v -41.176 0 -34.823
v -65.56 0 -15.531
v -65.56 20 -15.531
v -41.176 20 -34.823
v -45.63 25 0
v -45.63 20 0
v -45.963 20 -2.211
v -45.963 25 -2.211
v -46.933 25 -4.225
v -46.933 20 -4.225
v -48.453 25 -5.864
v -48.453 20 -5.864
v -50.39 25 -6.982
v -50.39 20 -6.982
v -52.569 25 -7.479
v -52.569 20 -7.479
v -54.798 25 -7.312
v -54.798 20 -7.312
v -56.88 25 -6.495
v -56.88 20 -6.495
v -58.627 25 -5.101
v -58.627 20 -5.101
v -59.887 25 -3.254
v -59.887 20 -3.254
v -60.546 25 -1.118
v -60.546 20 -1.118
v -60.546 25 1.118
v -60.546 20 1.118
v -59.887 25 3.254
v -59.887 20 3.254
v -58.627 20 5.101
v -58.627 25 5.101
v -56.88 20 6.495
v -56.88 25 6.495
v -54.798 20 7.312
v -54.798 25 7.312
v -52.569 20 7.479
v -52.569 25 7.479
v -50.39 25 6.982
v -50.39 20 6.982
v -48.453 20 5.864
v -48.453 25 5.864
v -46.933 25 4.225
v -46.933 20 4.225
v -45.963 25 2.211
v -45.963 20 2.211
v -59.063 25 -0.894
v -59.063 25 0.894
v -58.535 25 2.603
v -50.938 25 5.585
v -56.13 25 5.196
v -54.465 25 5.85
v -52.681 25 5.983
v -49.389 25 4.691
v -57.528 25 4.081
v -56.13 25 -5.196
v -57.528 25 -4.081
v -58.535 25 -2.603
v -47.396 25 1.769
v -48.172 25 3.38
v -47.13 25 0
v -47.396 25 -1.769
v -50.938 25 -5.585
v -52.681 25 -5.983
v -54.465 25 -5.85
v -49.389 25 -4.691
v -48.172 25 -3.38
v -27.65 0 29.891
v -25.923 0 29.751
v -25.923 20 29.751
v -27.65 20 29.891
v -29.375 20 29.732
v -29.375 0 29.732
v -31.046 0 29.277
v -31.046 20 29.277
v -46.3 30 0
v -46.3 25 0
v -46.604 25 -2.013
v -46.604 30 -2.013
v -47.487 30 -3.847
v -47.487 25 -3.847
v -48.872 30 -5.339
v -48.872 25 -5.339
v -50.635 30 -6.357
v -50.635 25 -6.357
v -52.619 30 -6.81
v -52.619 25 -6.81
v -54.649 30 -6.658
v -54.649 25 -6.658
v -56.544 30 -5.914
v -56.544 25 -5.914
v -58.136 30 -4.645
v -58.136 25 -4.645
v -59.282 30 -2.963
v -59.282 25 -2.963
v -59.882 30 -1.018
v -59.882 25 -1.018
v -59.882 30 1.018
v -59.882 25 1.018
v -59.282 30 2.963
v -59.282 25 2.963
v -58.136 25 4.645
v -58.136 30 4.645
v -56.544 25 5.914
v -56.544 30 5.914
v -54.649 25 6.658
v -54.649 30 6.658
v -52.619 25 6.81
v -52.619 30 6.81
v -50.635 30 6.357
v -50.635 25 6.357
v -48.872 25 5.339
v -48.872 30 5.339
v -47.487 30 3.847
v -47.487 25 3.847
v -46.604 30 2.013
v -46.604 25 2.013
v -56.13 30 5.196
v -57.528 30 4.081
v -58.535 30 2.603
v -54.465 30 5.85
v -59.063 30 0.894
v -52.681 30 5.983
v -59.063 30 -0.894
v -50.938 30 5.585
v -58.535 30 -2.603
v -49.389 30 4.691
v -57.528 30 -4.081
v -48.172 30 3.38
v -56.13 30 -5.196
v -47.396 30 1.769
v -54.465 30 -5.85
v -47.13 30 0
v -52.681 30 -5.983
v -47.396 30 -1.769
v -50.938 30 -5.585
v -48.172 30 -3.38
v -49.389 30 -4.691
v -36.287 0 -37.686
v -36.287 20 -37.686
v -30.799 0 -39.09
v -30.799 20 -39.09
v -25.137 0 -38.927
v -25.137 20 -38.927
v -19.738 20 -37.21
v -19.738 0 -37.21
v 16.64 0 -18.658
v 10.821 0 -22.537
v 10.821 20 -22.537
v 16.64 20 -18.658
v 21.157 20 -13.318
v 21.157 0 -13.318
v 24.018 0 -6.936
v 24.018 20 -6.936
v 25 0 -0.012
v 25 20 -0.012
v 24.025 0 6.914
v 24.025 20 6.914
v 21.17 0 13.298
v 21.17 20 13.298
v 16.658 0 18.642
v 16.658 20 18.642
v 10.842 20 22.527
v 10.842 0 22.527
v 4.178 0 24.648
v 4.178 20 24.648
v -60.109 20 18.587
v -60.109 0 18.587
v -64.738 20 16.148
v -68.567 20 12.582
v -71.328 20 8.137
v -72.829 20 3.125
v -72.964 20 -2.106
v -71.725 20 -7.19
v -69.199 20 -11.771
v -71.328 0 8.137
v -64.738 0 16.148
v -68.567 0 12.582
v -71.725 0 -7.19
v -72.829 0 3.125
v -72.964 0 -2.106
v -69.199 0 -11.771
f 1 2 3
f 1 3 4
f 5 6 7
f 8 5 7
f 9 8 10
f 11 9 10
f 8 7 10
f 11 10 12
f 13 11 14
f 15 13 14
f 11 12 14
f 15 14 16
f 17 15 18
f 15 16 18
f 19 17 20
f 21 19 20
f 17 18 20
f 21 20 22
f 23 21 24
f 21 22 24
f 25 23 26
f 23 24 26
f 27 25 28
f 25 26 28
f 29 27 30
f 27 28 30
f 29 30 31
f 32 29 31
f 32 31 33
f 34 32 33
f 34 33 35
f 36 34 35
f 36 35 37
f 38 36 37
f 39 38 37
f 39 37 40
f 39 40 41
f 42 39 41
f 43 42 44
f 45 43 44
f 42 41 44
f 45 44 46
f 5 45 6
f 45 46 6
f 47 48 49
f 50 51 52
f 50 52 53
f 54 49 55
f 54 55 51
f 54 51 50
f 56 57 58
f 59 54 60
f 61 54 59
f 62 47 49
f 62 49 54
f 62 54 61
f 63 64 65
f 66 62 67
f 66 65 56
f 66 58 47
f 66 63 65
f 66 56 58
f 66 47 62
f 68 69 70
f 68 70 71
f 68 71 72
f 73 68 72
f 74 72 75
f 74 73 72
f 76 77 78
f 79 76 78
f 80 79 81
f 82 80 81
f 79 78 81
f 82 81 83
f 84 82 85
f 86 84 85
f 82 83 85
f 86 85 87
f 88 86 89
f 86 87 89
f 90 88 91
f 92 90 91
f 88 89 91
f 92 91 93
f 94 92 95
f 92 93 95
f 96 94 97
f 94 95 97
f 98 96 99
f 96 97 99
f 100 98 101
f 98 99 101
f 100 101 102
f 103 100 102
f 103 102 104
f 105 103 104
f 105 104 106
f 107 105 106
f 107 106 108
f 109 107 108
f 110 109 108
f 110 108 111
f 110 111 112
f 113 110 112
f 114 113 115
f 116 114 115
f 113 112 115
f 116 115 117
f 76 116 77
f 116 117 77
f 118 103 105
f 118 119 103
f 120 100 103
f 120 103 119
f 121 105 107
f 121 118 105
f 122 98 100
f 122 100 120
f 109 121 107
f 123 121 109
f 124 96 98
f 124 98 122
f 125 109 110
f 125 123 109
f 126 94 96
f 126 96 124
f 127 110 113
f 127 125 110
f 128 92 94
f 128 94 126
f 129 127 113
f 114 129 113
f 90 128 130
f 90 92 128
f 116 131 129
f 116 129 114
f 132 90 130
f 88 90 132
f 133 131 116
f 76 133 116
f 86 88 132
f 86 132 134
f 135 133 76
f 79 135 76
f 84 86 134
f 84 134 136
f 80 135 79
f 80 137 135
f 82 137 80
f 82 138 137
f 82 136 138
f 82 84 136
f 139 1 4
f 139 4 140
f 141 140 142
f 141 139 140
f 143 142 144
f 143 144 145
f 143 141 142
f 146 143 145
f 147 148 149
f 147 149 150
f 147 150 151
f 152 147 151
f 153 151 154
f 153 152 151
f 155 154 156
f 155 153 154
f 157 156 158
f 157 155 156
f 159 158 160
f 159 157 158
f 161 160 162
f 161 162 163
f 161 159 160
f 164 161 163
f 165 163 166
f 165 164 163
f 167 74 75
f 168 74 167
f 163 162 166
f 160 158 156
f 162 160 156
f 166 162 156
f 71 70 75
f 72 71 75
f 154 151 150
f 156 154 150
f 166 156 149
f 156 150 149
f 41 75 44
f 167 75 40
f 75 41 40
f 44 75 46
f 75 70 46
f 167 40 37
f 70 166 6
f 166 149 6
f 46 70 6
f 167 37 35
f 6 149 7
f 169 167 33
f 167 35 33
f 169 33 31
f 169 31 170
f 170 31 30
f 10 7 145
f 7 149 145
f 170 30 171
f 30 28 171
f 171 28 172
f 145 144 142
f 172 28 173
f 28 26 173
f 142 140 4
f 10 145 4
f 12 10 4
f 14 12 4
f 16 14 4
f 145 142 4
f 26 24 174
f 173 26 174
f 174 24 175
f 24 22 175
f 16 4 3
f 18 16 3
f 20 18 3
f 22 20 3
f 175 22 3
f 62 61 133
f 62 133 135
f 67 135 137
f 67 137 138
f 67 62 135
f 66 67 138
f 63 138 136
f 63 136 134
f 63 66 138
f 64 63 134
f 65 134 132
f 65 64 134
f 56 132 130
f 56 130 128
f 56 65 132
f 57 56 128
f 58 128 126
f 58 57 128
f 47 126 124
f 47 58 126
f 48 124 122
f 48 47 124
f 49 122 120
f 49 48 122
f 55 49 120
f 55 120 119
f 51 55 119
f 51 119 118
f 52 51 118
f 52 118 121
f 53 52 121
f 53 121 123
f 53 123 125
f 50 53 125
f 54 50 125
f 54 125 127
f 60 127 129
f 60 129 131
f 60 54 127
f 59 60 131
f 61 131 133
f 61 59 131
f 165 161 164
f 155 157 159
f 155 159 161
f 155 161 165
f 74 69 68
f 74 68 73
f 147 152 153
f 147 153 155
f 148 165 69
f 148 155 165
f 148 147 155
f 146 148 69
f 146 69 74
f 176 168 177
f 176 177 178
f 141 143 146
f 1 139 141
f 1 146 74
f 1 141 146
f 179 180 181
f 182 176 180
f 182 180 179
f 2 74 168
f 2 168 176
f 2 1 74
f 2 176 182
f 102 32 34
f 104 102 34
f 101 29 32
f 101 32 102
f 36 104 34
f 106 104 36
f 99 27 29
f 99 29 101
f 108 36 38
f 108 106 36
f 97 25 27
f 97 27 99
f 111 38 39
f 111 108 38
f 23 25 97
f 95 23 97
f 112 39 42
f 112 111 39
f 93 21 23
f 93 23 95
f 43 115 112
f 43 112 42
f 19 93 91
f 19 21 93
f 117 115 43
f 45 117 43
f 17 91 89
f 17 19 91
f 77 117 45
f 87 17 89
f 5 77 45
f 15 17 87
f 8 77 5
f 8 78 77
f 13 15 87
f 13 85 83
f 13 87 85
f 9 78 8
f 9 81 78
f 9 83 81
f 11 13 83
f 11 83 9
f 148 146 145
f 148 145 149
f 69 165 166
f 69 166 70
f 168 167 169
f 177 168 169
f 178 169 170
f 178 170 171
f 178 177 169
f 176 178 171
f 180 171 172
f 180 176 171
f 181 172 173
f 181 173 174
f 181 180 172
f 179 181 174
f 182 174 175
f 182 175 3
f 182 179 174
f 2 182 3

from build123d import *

# Parameters (mm, degrees)
BOSS_EXTRUDE1_DEPTH = 20
SKETCH2_R           = 7.5
BOSS_EXTRUDE2_DEPTH = 5
SKETCH3_R           = 6.829132763
SKETCH3_R_2         = 6
BOSS_EXTRUDE3_DEPTH = 5


with BuildPart() as part:
    # Sketch1 → Boss-Extrude1 (new body)
    with BuildSketch(Plane(origin=(0, 0, 0), x_dir=(1, 0, 0), z_dir=(0, 1, 0))):
        with BuildLine():
            Line((-31.046293844, -29.276824699), (-60.108766173, -18.587025627))
            ThreePointArc((-60.108766173, -18.587025627), (-72.82850904, -3.124641863), (-65.560050374, 15.531367327))
            Line((-65.560050374, 15.531367327), (-41.175993118, 34.823361534))
            ThreePointArc((-41.175993118, 34.823361534), (-30.799217935, 39.089909616), (-19.738248933, 37.20952123))
            Line((-19.738248933, 37.20952123), (10.820861573, 22.53683551))
            ThreePointArc((10.820861573, 22.53683551), (24.755892372, -3.485081474), (4.178228718, -24.648375297))
            Line((4.178228718, -24.648375297), (-25.922904595, -29.750919304))
            ThreePointArc((-25.922904595, -29.750919304), (-28.515613019, -29.84902824), (-31.046293844, -29.276824699))
        make_face()
    extrude(amount=BOSS_EXTRUDE1_DEPTH)

    # Sketch2 → Boss-Extrude2 (add)
    with BuildSketch(Plane(origin=(0, 20, 0), x_dir=(1, 0, 0), z_dir=(0, 1, 0))):
        with Locations((-53.129573655, 0)):
            Circle(SKETCH2_R)
    extrude(amount=BOSS_EXTRUDE2_DEPTH)

    # Sketch3 → Boss-Extrude3 (add)
    with BuildSketch(Plane(origin=(0, 25, 0), x_dir=(1, 0, 0), z_dir=(0, 1, 0))):
        with Locations((-53.129573655, 0)):
            Circle(SKETCH3_R)
        with Locations((-53.129573655, 0)):
            Circle(SKETCH3_R_2, mode=Mode.SUBTRACT)
    extrude(amount=BOSS_EXTRUDE3_DEPTH)


solid = part.part
